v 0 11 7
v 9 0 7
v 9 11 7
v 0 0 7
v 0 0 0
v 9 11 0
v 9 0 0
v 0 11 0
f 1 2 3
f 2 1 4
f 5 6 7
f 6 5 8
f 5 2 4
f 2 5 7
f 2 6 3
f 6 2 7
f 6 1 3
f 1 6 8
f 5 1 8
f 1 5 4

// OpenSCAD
// Generated by SolidPython 1.0.1 on 2020-07-29 00:46:55


cube(size = [9, 11, 7]);
/***********************************************
*********      SolidPython code:      **********
************************************************
 
# import packages: SolidPython
from solid import *
from solid.utils import *
from itertools import chain, combinations, permutations


class Resize:

    def __init__(self, scad_file):
        self.scad_file = scad_file
        #self.scad_file = import_scad(scad_file)
        # cone/cylinder param:
        self.r1 = 0
        self.r2 = 0
        self.h = 0
        # rectangular prism param:
        self.w = 0
        self.l = 0
        # ellipse param:
        self.r = 0

    # import OpenScad code (file name corresponds to shape)


    # classify shape + parameters
    def assign(self, param1, param2, param3):
        if self.scad_file == 'cone.scad':
            self.r1 = param1
            self.r2 = param2
            self.h = param3
        elif self.scad_file == 'cylinder.scad':
            self.r1 = param1
            self.r2 = param2
            self.h = param3
        elif self.scad_file == 'rectangularPrism.scad':
            self.h = param1
            self.l = param2
            self.w = param3
        else:
            self.r = param1
            self.h = param2

    # resize parameters
    def iterate(self):
        x = range(3, 20, 2)
        i = 1
        if self.scad_file == 'cone.scad':
            tempList = list(permutations(x, 2))
            for temp in tempList:
                param1 = temp[0]
                param2 = temp[1]
                filepath = 'produced_scad_files/' + 'cone' + str(param1) + '_' + str(param2) + '_' + '.scad'
                scad_render_to_file(cylinder(h=param1, r1=param2, r2=0), filepath)

        elif self.scad_file == 'cylinder.scad':
            tempList = list(permutations(x, 3))
            for temp in tempList:
                param1 = temp[0]
                param2 = temp[1]
                filepath = 'produced_scad_files/' + 'cylinder' + str(param1) + '_' + str(param2) + '_' + '.scad'
                scad_render_to_file(cylinder(h=param1, r1=param2, r2=param2), filepath)

        elif self.scad_file == 'rectangularPrism.scad':
            tempList = list(permutations(x, 3))
            for temp in tempList:
                param1 = temp[0]
                param2 = temp[1]
                param3 = temp[2]
                filepath = 'produced_scad_files/' + 'rectangularPrism' + str(param1) + '_' + str(param2) + '_' + str(
                    param3) + '.scad'
                scad_render_to_file(cube(size=(param1, param2, param3)), filepath)

        elif self.scad_file == 'ellipse.scad':
            tempList = list(permutations(x, 4))
            for temp in tempList:
                param1 = temp[0]
                param2 = temp[1]
                param3 = temp[2]
                param4 = temp[3]
                filepath = 'produced_scad_files/' + 'ellipse' + str(param1) + '_' + str(param2) + '_' + str(param3) + '_' + str(param4) + '.scad'
                scad_render_to_file(scale([param1, param2, param3])(sphere(r=param4)), filepath)

    def render_to_scadfile(self):
        scad_render_to_file(scad, 'example.scad') 
 
************************************************/
